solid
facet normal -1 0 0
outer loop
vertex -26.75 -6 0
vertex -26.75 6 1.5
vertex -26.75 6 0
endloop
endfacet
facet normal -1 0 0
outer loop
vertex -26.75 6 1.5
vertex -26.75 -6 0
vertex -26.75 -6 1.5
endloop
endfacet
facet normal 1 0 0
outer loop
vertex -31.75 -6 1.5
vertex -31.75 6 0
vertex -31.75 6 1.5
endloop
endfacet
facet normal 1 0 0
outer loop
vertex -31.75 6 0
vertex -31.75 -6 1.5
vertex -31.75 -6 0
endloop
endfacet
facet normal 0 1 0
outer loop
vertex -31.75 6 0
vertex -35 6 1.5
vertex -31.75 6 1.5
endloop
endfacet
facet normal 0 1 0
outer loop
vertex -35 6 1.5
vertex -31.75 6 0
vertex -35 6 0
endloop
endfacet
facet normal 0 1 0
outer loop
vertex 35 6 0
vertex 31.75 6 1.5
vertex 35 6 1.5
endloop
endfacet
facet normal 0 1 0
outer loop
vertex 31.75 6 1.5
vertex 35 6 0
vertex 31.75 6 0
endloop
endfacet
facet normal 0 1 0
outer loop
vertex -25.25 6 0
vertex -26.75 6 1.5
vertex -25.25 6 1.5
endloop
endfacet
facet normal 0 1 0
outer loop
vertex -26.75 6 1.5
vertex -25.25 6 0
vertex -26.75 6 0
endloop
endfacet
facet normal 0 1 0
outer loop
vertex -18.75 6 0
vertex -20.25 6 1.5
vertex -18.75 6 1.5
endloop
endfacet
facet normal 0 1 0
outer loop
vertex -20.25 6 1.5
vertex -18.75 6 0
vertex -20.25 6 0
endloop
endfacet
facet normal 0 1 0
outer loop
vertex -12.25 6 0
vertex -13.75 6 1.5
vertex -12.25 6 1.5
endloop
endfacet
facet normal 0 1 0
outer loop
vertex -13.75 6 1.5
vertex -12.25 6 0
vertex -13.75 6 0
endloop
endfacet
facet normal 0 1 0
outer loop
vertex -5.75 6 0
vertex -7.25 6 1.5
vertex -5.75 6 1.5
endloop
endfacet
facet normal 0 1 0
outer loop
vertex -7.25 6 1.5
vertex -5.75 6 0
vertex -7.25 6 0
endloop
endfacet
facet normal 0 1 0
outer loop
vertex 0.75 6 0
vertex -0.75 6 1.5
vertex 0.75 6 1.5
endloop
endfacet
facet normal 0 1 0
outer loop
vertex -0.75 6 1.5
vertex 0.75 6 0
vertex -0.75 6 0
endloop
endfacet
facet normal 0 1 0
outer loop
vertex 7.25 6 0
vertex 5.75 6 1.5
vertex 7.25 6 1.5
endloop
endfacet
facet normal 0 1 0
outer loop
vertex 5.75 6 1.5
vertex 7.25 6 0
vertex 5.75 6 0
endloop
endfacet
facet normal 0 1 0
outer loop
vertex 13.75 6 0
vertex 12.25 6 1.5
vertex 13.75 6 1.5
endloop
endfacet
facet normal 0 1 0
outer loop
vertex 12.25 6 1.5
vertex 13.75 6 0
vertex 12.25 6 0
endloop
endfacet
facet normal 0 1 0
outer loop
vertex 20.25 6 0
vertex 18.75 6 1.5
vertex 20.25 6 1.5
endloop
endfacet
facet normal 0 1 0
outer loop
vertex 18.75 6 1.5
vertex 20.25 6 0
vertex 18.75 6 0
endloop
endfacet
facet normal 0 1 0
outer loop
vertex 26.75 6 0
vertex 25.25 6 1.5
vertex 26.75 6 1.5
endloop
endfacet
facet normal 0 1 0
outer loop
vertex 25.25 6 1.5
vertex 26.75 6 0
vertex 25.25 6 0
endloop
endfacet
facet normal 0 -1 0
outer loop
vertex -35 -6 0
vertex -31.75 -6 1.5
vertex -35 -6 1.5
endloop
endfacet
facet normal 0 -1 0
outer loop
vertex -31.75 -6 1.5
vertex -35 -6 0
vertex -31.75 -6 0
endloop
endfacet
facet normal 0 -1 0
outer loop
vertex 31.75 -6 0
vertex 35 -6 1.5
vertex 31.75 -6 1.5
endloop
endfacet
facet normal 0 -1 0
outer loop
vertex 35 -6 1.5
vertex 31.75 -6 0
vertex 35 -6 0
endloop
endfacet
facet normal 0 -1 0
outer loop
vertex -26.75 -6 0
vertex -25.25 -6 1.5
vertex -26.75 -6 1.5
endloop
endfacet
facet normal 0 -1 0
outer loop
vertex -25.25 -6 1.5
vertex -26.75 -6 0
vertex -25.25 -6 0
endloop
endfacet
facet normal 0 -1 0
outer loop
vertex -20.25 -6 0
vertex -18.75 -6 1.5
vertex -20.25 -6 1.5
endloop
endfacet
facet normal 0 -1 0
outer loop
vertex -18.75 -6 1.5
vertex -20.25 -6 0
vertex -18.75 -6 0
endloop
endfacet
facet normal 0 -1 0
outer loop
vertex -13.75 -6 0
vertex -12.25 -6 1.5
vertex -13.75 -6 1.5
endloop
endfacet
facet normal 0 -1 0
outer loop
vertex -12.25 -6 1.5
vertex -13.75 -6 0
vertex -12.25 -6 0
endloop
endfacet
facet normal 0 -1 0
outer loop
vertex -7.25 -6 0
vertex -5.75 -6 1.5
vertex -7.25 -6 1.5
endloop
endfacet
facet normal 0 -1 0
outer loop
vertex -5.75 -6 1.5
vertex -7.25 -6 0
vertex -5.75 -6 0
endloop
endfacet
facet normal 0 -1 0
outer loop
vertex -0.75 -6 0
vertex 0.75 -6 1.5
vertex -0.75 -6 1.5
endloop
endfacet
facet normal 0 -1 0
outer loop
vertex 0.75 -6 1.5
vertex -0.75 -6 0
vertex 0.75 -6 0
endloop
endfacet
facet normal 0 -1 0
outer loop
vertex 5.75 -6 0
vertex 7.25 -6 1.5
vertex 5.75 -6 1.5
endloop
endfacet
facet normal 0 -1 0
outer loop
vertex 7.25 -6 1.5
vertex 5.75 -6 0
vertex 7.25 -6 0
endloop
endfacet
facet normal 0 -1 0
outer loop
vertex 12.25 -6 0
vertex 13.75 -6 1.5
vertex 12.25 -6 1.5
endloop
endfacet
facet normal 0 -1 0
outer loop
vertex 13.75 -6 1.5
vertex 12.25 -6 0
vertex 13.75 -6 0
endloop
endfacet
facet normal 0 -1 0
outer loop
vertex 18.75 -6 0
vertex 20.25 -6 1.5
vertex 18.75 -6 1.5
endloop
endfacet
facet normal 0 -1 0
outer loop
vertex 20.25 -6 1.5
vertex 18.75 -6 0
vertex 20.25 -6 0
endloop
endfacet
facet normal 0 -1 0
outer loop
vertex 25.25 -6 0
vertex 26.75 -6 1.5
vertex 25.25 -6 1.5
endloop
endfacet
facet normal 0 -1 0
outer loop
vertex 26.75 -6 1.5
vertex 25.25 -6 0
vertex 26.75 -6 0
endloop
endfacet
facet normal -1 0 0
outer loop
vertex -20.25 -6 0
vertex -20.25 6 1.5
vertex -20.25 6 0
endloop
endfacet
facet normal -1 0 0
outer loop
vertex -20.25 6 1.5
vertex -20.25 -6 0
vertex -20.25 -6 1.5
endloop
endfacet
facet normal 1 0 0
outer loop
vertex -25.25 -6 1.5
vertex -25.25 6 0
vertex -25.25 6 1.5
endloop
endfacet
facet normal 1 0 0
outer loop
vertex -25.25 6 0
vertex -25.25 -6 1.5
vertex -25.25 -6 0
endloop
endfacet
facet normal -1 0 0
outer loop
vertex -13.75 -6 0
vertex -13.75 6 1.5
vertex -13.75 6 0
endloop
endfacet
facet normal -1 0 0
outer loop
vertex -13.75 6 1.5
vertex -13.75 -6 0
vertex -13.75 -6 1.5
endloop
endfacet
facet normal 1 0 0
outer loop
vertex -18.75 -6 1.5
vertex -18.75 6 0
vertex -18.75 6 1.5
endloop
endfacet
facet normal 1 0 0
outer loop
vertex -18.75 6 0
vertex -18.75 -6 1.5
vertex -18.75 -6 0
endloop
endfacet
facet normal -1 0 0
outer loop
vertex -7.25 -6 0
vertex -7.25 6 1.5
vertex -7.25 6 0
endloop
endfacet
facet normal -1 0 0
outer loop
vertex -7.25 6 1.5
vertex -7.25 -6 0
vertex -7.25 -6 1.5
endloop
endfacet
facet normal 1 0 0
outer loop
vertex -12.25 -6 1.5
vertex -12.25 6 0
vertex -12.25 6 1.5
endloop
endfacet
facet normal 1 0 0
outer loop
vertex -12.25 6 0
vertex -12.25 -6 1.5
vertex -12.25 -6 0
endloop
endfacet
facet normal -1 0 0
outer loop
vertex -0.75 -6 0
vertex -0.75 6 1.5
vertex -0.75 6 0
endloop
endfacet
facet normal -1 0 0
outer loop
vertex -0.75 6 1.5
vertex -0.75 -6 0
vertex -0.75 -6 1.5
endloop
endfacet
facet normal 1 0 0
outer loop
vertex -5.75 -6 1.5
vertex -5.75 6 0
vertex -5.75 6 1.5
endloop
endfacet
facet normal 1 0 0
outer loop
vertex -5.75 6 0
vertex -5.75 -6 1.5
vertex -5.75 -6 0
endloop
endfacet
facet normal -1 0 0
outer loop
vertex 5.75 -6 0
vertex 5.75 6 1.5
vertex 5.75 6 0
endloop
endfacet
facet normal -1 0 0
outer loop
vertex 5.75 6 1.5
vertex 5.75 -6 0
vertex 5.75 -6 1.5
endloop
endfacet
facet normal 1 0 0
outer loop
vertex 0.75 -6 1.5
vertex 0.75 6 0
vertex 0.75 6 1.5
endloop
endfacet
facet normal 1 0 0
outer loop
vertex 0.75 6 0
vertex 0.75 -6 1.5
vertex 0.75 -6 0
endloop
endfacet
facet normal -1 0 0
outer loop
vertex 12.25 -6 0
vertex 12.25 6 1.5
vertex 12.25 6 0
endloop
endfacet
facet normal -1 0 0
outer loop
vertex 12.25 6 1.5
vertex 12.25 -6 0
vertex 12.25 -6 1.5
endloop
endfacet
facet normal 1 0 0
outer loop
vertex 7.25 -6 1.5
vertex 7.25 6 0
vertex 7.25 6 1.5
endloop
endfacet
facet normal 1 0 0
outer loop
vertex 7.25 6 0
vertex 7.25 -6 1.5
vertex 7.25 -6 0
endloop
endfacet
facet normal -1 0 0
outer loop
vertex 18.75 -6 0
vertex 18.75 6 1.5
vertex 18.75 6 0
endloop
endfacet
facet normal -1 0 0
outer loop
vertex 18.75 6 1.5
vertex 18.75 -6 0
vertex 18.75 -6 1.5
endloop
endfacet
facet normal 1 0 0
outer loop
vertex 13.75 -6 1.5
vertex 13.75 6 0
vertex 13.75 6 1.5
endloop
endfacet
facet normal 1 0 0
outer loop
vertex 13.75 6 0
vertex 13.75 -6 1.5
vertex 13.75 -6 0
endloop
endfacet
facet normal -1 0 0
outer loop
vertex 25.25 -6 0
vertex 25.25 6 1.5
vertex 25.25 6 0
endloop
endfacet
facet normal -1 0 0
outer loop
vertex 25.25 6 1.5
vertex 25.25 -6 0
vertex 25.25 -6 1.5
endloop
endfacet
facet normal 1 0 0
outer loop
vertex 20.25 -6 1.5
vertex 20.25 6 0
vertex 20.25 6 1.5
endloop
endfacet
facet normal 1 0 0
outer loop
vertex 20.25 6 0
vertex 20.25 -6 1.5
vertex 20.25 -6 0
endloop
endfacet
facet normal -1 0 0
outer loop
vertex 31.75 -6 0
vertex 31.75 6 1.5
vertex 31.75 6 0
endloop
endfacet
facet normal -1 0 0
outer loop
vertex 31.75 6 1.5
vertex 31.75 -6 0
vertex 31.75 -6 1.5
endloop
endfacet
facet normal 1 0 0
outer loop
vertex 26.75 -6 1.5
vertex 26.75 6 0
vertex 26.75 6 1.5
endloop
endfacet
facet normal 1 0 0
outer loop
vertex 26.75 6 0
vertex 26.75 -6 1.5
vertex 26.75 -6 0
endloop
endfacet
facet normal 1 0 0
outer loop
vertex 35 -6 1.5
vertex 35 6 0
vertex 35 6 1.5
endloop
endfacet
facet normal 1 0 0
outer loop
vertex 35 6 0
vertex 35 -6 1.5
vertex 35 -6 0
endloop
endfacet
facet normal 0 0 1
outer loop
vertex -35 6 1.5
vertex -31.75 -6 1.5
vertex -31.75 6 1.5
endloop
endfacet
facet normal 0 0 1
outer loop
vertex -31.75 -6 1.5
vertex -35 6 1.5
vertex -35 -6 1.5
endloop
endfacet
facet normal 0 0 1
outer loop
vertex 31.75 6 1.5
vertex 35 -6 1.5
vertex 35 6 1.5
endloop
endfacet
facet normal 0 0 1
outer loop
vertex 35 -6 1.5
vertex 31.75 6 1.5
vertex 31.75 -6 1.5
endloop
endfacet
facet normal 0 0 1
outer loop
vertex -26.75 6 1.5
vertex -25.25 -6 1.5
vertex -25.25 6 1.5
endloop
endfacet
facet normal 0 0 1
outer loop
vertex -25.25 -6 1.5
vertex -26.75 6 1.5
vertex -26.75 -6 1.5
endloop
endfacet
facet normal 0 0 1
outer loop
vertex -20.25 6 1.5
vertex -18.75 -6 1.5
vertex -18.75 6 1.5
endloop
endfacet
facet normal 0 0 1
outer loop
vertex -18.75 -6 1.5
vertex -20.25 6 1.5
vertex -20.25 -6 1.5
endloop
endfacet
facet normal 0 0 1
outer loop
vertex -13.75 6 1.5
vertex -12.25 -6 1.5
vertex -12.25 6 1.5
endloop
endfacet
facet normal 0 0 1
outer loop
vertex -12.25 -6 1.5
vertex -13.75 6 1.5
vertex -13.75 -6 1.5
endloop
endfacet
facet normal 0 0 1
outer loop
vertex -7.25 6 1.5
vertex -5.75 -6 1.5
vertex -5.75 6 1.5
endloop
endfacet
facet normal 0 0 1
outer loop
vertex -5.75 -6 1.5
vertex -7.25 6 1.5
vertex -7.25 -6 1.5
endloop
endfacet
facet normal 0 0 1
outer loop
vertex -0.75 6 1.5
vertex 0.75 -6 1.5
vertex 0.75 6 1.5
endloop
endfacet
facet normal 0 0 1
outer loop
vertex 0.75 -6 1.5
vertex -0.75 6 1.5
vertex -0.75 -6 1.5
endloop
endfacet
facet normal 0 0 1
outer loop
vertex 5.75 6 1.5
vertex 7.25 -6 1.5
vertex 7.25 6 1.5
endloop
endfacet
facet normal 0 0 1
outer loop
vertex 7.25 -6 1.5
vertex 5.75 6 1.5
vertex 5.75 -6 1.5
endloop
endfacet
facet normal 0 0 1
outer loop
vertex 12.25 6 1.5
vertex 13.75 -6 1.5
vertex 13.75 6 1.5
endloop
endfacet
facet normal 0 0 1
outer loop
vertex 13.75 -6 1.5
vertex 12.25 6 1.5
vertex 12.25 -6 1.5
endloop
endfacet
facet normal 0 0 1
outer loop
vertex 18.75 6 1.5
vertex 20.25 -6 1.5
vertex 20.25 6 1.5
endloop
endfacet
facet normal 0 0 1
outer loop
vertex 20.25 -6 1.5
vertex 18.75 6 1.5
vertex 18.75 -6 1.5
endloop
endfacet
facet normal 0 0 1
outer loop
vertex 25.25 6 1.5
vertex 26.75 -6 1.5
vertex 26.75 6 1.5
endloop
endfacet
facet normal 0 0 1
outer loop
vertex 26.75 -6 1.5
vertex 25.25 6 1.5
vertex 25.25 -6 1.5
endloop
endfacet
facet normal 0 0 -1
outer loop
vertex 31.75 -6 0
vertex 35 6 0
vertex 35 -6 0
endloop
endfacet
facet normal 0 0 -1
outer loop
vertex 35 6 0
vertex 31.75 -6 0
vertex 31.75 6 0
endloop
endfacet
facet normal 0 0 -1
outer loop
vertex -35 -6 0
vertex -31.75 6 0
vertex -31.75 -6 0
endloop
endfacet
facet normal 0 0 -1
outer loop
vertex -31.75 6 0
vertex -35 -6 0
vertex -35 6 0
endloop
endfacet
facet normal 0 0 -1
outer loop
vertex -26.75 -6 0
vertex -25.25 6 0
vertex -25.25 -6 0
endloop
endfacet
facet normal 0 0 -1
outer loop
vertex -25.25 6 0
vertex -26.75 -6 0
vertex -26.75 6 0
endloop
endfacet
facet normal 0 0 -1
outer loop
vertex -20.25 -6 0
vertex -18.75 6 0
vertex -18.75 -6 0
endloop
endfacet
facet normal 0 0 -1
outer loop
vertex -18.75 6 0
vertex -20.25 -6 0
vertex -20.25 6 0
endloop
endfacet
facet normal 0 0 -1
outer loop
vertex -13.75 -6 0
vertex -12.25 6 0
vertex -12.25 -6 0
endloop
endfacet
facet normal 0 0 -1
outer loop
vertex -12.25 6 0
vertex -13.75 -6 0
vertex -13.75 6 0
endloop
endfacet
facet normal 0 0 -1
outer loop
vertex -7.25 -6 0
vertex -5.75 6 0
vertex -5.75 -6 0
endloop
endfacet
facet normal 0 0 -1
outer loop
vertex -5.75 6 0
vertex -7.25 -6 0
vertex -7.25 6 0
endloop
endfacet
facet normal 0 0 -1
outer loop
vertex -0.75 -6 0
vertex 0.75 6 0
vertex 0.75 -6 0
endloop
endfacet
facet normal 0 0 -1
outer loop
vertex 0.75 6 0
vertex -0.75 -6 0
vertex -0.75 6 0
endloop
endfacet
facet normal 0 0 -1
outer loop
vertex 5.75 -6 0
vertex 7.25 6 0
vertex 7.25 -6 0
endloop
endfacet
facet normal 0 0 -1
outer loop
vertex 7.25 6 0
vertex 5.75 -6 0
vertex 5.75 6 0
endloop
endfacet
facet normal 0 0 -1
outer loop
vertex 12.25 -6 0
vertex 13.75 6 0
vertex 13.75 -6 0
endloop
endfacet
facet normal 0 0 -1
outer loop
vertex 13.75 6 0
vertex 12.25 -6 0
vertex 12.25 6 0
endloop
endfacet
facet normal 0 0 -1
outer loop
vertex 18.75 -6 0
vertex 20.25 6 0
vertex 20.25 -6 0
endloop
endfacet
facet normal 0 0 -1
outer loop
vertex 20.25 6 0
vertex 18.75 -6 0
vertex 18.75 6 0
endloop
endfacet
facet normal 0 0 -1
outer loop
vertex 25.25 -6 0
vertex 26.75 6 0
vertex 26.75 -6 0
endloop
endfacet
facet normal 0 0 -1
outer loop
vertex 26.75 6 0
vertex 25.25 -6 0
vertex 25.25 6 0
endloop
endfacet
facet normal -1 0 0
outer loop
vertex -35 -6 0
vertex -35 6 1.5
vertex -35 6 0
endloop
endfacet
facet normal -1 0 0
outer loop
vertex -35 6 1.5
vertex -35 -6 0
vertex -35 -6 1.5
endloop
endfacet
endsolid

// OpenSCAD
// 10-well comb for casting agarose gels
// Print orientation: flat on bed, teeth pointing down (-Z)

// ---- Dimensions (mm) ----
plate_t      = 1.5;    // plate thickness (Z)
spine_len    = 70;     // spine length (X)
spine_w      = 12;     // spine width (Y)
tooth_n      = 10;     // number of teeth
tooth_w      = 5.0;    // tooth width (X)
tooth_l      = 12;     // tooth length (Y)
gap          = 1.5;    // gap between teeth (X)
eps          = 0.5;    // cutter overshoot

$fn = 64;

pitch = tooth_w + gap;

difference() {
    // Plate
    translate([-spine_len/2, -spine_w/2, 0])
        cube([spine_len, spine_w, plate_t]);

    // Teeth
    for (i = [0 : tooth_n - 1]) {
        x = (i - (tooth_n - 1)/2) * pitch;
        translate([x - tooth_w/2, -tooth_l/2, -eps])
            cube([tooth_w, tooth_l, plate_t + 2*eps]);
    }
}
